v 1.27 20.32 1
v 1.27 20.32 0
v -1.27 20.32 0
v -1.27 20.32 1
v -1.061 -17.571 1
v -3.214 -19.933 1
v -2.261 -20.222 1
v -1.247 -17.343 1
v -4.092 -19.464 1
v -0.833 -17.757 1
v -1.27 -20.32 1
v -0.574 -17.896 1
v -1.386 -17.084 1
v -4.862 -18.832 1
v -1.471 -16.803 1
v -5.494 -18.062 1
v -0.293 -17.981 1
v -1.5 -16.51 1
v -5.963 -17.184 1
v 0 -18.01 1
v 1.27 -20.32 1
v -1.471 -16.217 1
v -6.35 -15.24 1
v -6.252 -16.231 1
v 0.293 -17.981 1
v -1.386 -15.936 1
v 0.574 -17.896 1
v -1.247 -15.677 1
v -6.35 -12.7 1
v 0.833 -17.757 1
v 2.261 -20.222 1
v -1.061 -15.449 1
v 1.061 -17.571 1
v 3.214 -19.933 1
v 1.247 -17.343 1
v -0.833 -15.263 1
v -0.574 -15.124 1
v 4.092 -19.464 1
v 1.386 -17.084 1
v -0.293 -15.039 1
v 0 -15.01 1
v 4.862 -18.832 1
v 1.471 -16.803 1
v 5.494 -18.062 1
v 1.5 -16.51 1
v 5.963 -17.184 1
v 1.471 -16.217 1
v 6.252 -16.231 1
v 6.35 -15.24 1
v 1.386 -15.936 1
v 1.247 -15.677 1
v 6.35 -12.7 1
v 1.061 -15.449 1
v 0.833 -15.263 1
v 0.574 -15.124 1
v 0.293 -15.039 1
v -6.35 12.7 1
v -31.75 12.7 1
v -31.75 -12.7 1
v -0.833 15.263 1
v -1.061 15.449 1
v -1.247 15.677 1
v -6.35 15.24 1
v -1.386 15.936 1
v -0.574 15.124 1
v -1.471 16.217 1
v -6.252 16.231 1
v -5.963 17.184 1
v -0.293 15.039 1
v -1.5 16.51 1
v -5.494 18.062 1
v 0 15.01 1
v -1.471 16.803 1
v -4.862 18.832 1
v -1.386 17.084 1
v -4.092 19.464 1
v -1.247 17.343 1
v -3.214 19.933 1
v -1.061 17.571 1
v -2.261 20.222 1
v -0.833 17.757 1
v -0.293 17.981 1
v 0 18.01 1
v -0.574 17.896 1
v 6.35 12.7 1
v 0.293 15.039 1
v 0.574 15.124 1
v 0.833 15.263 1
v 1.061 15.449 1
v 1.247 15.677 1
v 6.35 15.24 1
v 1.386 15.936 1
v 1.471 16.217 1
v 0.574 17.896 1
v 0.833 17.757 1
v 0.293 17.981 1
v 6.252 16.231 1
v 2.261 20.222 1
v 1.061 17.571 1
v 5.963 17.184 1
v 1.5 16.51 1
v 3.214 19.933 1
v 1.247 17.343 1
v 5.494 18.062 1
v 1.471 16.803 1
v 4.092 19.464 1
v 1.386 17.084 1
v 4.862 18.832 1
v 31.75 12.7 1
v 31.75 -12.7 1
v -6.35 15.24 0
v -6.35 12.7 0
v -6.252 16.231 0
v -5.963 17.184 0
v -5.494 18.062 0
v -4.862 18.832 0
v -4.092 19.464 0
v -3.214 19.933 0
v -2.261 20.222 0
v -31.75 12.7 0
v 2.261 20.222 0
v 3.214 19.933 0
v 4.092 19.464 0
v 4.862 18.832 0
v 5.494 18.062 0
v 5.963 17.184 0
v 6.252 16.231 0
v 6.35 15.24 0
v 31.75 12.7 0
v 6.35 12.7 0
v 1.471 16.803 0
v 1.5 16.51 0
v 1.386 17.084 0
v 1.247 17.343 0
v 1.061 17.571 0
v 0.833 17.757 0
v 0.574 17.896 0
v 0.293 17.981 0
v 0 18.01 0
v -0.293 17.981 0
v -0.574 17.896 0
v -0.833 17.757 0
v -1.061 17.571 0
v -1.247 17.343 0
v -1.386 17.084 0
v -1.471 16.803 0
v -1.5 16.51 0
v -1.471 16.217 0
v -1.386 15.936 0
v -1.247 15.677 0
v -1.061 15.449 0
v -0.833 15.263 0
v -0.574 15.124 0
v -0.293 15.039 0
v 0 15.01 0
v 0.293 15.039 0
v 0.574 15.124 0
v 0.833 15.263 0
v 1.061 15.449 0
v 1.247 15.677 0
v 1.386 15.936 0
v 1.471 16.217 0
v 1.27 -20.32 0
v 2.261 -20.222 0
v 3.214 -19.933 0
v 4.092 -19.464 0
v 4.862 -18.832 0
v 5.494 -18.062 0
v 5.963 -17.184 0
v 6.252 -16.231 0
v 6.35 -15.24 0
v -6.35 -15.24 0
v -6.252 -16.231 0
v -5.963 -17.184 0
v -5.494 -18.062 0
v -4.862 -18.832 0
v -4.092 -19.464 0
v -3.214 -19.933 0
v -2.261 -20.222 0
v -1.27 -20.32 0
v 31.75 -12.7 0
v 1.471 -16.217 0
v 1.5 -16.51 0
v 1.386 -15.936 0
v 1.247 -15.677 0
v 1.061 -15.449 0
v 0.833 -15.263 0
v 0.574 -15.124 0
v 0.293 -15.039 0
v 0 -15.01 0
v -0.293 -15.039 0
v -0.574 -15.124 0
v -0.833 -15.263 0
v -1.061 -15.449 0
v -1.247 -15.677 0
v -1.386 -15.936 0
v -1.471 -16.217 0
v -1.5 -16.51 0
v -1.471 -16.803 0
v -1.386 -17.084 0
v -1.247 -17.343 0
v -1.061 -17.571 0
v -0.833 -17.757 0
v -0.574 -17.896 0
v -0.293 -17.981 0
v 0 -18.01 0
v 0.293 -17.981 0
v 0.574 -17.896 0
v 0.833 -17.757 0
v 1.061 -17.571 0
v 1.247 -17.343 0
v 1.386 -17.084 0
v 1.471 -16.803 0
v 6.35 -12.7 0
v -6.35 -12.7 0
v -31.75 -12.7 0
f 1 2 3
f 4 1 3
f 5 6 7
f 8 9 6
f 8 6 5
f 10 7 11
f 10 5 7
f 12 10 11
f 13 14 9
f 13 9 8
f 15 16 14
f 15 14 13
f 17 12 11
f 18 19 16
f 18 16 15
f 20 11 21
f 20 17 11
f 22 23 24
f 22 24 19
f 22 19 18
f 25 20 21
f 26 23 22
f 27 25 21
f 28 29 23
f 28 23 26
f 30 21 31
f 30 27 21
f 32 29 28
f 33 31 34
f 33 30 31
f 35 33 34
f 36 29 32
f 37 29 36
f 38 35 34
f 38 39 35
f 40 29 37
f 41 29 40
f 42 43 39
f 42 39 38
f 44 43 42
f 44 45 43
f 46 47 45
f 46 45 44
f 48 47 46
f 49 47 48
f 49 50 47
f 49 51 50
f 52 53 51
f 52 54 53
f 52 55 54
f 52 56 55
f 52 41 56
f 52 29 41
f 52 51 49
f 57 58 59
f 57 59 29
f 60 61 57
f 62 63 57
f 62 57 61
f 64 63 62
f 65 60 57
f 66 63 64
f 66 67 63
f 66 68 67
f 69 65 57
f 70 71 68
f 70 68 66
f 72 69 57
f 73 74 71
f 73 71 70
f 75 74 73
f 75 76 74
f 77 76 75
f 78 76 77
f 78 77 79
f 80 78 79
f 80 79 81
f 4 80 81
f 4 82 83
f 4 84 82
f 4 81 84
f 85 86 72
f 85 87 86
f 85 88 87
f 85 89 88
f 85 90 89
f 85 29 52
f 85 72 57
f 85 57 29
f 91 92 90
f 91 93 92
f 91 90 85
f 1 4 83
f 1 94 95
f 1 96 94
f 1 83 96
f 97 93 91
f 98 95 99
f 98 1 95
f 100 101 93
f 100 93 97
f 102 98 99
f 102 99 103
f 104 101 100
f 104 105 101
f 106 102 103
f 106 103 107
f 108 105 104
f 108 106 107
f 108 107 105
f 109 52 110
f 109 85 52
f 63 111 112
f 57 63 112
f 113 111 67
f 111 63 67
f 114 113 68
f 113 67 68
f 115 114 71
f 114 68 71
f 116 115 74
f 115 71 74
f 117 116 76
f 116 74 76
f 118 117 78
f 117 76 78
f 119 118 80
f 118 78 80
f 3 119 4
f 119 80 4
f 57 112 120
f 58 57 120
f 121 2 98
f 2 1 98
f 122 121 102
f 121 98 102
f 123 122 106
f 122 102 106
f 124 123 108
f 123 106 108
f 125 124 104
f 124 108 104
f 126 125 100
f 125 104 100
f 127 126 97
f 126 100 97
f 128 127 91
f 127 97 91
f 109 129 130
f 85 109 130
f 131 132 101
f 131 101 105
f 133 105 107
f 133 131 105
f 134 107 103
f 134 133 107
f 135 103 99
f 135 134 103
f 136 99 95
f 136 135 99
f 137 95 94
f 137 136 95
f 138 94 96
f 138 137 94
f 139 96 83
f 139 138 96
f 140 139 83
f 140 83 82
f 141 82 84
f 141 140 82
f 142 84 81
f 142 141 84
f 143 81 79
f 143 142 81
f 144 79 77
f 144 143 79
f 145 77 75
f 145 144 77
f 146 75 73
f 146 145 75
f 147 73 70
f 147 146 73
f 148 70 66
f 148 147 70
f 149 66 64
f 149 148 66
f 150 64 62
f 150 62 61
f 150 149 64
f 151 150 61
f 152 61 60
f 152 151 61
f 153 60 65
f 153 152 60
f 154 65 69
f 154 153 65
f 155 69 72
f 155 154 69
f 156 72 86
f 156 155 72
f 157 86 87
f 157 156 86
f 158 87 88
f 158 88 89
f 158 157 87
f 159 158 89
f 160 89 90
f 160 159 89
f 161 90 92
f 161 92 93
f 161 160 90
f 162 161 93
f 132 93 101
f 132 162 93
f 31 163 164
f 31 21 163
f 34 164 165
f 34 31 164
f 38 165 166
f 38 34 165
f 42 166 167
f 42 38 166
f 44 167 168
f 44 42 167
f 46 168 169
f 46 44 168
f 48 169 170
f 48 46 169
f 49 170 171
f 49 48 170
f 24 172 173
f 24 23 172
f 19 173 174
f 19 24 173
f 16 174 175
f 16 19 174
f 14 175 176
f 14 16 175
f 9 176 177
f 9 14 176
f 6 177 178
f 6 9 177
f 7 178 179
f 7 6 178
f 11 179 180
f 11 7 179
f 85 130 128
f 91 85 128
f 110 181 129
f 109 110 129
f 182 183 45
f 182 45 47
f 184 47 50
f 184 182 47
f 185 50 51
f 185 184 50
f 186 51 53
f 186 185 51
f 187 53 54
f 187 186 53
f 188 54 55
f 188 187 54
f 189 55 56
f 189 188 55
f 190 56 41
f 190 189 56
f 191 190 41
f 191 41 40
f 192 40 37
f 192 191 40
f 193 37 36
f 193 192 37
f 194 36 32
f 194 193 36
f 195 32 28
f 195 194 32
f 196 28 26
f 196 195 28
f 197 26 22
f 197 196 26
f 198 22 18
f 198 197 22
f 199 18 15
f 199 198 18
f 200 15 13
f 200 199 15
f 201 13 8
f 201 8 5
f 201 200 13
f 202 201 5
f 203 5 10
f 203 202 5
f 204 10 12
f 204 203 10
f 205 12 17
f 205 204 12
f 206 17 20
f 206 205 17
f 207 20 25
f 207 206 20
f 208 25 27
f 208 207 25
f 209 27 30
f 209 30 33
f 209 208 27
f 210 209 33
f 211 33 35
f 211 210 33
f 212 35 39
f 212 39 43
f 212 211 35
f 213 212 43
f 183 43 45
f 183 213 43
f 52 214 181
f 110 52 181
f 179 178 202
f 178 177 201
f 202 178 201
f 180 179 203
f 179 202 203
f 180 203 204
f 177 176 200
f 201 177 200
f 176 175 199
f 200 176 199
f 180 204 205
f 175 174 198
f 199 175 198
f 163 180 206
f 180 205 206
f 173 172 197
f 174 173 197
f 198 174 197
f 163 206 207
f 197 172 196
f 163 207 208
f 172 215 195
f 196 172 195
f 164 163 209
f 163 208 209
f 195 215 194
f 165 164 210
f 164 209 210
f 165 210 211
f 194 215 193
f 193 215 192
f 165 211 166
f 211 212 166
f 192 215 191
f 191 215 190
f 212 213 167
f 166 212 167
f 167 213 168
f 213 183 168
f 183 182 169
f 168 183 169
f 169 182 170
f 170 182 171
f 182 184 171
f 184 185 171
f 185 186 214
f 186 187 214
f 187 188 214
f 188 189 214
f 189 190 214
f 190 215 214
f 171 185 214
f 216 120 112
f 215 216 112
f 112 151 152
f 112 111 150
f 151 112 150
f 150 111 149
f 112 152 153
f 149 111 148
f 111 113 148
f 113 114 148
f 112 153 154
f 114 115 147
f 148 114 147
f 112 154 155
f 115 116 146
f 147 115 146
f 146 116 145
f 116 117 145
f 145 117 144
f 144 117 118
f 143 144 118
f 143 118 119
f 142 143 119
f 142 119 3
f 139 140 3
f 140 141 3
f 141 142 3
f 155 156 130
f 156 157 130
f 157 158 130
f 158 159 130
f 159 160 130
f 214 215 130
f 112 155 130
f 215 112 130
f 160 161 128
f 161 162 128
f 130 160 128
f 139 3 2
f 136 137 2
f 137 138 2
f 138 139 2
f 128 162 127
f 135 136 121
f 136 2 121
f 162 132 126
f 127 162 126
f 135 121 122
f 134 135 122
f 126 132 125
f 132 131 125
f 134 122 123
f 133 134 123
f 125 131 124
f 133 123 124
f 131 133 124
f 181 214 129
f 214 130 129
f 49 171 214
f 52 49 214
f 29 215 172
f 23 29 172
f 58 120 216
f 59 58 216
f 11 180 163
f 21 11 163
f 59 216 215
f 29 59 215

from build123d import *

# Parameters (mm, degrees)
F0_R     = 1.5
F1_DEPTH = 1
F2_R     = 5.08


with BuildPart() as f1:
    # F0 (on Top) → F1 (new body)
    with BuildSketch(Plane.XY):
        Polygon((-6.35, 12.7), (6.35, 12.7), (6.35, 16.51), (6.35, 20.32), (-6.35, 20.32), align=None)
        with Locations((0, 16.51)):
            Circle(F0_R, mode=Mode.SUBTRACT)
        Polygon((31.75, -12.7), (31.75, 12.7), (6.35, 12.7), (-6.35, 12.7), (-31.75, 12.7), (-31.75, -12.7), (-6.35, -12.7), (6.35, -12.7), align=None)
        Polygon((6.35, -16.51), (6.35, -12.7), (-6.35, -12.7), (-6.35, -20.32), (6.35, -20.32), align=None)
        with Locations((0, -16.51)):
            Circle(F0_R, mode=Mode.SUBTRACT)
    extrude(amount=F1_DEPTH)

    # F2
    f2_edges = [f1.edges().sort_by_distance(p)[0] for p in [
        (6.35, 20.32, 0.5),
        (-6.35, 20.32, 0.5),
        (-6.35, -20.32, 0.5),
        (6.35, -20.32, 0.5),
    ]]
    fillet(f2_edges, radius=F2_R)


solid = f1.part
